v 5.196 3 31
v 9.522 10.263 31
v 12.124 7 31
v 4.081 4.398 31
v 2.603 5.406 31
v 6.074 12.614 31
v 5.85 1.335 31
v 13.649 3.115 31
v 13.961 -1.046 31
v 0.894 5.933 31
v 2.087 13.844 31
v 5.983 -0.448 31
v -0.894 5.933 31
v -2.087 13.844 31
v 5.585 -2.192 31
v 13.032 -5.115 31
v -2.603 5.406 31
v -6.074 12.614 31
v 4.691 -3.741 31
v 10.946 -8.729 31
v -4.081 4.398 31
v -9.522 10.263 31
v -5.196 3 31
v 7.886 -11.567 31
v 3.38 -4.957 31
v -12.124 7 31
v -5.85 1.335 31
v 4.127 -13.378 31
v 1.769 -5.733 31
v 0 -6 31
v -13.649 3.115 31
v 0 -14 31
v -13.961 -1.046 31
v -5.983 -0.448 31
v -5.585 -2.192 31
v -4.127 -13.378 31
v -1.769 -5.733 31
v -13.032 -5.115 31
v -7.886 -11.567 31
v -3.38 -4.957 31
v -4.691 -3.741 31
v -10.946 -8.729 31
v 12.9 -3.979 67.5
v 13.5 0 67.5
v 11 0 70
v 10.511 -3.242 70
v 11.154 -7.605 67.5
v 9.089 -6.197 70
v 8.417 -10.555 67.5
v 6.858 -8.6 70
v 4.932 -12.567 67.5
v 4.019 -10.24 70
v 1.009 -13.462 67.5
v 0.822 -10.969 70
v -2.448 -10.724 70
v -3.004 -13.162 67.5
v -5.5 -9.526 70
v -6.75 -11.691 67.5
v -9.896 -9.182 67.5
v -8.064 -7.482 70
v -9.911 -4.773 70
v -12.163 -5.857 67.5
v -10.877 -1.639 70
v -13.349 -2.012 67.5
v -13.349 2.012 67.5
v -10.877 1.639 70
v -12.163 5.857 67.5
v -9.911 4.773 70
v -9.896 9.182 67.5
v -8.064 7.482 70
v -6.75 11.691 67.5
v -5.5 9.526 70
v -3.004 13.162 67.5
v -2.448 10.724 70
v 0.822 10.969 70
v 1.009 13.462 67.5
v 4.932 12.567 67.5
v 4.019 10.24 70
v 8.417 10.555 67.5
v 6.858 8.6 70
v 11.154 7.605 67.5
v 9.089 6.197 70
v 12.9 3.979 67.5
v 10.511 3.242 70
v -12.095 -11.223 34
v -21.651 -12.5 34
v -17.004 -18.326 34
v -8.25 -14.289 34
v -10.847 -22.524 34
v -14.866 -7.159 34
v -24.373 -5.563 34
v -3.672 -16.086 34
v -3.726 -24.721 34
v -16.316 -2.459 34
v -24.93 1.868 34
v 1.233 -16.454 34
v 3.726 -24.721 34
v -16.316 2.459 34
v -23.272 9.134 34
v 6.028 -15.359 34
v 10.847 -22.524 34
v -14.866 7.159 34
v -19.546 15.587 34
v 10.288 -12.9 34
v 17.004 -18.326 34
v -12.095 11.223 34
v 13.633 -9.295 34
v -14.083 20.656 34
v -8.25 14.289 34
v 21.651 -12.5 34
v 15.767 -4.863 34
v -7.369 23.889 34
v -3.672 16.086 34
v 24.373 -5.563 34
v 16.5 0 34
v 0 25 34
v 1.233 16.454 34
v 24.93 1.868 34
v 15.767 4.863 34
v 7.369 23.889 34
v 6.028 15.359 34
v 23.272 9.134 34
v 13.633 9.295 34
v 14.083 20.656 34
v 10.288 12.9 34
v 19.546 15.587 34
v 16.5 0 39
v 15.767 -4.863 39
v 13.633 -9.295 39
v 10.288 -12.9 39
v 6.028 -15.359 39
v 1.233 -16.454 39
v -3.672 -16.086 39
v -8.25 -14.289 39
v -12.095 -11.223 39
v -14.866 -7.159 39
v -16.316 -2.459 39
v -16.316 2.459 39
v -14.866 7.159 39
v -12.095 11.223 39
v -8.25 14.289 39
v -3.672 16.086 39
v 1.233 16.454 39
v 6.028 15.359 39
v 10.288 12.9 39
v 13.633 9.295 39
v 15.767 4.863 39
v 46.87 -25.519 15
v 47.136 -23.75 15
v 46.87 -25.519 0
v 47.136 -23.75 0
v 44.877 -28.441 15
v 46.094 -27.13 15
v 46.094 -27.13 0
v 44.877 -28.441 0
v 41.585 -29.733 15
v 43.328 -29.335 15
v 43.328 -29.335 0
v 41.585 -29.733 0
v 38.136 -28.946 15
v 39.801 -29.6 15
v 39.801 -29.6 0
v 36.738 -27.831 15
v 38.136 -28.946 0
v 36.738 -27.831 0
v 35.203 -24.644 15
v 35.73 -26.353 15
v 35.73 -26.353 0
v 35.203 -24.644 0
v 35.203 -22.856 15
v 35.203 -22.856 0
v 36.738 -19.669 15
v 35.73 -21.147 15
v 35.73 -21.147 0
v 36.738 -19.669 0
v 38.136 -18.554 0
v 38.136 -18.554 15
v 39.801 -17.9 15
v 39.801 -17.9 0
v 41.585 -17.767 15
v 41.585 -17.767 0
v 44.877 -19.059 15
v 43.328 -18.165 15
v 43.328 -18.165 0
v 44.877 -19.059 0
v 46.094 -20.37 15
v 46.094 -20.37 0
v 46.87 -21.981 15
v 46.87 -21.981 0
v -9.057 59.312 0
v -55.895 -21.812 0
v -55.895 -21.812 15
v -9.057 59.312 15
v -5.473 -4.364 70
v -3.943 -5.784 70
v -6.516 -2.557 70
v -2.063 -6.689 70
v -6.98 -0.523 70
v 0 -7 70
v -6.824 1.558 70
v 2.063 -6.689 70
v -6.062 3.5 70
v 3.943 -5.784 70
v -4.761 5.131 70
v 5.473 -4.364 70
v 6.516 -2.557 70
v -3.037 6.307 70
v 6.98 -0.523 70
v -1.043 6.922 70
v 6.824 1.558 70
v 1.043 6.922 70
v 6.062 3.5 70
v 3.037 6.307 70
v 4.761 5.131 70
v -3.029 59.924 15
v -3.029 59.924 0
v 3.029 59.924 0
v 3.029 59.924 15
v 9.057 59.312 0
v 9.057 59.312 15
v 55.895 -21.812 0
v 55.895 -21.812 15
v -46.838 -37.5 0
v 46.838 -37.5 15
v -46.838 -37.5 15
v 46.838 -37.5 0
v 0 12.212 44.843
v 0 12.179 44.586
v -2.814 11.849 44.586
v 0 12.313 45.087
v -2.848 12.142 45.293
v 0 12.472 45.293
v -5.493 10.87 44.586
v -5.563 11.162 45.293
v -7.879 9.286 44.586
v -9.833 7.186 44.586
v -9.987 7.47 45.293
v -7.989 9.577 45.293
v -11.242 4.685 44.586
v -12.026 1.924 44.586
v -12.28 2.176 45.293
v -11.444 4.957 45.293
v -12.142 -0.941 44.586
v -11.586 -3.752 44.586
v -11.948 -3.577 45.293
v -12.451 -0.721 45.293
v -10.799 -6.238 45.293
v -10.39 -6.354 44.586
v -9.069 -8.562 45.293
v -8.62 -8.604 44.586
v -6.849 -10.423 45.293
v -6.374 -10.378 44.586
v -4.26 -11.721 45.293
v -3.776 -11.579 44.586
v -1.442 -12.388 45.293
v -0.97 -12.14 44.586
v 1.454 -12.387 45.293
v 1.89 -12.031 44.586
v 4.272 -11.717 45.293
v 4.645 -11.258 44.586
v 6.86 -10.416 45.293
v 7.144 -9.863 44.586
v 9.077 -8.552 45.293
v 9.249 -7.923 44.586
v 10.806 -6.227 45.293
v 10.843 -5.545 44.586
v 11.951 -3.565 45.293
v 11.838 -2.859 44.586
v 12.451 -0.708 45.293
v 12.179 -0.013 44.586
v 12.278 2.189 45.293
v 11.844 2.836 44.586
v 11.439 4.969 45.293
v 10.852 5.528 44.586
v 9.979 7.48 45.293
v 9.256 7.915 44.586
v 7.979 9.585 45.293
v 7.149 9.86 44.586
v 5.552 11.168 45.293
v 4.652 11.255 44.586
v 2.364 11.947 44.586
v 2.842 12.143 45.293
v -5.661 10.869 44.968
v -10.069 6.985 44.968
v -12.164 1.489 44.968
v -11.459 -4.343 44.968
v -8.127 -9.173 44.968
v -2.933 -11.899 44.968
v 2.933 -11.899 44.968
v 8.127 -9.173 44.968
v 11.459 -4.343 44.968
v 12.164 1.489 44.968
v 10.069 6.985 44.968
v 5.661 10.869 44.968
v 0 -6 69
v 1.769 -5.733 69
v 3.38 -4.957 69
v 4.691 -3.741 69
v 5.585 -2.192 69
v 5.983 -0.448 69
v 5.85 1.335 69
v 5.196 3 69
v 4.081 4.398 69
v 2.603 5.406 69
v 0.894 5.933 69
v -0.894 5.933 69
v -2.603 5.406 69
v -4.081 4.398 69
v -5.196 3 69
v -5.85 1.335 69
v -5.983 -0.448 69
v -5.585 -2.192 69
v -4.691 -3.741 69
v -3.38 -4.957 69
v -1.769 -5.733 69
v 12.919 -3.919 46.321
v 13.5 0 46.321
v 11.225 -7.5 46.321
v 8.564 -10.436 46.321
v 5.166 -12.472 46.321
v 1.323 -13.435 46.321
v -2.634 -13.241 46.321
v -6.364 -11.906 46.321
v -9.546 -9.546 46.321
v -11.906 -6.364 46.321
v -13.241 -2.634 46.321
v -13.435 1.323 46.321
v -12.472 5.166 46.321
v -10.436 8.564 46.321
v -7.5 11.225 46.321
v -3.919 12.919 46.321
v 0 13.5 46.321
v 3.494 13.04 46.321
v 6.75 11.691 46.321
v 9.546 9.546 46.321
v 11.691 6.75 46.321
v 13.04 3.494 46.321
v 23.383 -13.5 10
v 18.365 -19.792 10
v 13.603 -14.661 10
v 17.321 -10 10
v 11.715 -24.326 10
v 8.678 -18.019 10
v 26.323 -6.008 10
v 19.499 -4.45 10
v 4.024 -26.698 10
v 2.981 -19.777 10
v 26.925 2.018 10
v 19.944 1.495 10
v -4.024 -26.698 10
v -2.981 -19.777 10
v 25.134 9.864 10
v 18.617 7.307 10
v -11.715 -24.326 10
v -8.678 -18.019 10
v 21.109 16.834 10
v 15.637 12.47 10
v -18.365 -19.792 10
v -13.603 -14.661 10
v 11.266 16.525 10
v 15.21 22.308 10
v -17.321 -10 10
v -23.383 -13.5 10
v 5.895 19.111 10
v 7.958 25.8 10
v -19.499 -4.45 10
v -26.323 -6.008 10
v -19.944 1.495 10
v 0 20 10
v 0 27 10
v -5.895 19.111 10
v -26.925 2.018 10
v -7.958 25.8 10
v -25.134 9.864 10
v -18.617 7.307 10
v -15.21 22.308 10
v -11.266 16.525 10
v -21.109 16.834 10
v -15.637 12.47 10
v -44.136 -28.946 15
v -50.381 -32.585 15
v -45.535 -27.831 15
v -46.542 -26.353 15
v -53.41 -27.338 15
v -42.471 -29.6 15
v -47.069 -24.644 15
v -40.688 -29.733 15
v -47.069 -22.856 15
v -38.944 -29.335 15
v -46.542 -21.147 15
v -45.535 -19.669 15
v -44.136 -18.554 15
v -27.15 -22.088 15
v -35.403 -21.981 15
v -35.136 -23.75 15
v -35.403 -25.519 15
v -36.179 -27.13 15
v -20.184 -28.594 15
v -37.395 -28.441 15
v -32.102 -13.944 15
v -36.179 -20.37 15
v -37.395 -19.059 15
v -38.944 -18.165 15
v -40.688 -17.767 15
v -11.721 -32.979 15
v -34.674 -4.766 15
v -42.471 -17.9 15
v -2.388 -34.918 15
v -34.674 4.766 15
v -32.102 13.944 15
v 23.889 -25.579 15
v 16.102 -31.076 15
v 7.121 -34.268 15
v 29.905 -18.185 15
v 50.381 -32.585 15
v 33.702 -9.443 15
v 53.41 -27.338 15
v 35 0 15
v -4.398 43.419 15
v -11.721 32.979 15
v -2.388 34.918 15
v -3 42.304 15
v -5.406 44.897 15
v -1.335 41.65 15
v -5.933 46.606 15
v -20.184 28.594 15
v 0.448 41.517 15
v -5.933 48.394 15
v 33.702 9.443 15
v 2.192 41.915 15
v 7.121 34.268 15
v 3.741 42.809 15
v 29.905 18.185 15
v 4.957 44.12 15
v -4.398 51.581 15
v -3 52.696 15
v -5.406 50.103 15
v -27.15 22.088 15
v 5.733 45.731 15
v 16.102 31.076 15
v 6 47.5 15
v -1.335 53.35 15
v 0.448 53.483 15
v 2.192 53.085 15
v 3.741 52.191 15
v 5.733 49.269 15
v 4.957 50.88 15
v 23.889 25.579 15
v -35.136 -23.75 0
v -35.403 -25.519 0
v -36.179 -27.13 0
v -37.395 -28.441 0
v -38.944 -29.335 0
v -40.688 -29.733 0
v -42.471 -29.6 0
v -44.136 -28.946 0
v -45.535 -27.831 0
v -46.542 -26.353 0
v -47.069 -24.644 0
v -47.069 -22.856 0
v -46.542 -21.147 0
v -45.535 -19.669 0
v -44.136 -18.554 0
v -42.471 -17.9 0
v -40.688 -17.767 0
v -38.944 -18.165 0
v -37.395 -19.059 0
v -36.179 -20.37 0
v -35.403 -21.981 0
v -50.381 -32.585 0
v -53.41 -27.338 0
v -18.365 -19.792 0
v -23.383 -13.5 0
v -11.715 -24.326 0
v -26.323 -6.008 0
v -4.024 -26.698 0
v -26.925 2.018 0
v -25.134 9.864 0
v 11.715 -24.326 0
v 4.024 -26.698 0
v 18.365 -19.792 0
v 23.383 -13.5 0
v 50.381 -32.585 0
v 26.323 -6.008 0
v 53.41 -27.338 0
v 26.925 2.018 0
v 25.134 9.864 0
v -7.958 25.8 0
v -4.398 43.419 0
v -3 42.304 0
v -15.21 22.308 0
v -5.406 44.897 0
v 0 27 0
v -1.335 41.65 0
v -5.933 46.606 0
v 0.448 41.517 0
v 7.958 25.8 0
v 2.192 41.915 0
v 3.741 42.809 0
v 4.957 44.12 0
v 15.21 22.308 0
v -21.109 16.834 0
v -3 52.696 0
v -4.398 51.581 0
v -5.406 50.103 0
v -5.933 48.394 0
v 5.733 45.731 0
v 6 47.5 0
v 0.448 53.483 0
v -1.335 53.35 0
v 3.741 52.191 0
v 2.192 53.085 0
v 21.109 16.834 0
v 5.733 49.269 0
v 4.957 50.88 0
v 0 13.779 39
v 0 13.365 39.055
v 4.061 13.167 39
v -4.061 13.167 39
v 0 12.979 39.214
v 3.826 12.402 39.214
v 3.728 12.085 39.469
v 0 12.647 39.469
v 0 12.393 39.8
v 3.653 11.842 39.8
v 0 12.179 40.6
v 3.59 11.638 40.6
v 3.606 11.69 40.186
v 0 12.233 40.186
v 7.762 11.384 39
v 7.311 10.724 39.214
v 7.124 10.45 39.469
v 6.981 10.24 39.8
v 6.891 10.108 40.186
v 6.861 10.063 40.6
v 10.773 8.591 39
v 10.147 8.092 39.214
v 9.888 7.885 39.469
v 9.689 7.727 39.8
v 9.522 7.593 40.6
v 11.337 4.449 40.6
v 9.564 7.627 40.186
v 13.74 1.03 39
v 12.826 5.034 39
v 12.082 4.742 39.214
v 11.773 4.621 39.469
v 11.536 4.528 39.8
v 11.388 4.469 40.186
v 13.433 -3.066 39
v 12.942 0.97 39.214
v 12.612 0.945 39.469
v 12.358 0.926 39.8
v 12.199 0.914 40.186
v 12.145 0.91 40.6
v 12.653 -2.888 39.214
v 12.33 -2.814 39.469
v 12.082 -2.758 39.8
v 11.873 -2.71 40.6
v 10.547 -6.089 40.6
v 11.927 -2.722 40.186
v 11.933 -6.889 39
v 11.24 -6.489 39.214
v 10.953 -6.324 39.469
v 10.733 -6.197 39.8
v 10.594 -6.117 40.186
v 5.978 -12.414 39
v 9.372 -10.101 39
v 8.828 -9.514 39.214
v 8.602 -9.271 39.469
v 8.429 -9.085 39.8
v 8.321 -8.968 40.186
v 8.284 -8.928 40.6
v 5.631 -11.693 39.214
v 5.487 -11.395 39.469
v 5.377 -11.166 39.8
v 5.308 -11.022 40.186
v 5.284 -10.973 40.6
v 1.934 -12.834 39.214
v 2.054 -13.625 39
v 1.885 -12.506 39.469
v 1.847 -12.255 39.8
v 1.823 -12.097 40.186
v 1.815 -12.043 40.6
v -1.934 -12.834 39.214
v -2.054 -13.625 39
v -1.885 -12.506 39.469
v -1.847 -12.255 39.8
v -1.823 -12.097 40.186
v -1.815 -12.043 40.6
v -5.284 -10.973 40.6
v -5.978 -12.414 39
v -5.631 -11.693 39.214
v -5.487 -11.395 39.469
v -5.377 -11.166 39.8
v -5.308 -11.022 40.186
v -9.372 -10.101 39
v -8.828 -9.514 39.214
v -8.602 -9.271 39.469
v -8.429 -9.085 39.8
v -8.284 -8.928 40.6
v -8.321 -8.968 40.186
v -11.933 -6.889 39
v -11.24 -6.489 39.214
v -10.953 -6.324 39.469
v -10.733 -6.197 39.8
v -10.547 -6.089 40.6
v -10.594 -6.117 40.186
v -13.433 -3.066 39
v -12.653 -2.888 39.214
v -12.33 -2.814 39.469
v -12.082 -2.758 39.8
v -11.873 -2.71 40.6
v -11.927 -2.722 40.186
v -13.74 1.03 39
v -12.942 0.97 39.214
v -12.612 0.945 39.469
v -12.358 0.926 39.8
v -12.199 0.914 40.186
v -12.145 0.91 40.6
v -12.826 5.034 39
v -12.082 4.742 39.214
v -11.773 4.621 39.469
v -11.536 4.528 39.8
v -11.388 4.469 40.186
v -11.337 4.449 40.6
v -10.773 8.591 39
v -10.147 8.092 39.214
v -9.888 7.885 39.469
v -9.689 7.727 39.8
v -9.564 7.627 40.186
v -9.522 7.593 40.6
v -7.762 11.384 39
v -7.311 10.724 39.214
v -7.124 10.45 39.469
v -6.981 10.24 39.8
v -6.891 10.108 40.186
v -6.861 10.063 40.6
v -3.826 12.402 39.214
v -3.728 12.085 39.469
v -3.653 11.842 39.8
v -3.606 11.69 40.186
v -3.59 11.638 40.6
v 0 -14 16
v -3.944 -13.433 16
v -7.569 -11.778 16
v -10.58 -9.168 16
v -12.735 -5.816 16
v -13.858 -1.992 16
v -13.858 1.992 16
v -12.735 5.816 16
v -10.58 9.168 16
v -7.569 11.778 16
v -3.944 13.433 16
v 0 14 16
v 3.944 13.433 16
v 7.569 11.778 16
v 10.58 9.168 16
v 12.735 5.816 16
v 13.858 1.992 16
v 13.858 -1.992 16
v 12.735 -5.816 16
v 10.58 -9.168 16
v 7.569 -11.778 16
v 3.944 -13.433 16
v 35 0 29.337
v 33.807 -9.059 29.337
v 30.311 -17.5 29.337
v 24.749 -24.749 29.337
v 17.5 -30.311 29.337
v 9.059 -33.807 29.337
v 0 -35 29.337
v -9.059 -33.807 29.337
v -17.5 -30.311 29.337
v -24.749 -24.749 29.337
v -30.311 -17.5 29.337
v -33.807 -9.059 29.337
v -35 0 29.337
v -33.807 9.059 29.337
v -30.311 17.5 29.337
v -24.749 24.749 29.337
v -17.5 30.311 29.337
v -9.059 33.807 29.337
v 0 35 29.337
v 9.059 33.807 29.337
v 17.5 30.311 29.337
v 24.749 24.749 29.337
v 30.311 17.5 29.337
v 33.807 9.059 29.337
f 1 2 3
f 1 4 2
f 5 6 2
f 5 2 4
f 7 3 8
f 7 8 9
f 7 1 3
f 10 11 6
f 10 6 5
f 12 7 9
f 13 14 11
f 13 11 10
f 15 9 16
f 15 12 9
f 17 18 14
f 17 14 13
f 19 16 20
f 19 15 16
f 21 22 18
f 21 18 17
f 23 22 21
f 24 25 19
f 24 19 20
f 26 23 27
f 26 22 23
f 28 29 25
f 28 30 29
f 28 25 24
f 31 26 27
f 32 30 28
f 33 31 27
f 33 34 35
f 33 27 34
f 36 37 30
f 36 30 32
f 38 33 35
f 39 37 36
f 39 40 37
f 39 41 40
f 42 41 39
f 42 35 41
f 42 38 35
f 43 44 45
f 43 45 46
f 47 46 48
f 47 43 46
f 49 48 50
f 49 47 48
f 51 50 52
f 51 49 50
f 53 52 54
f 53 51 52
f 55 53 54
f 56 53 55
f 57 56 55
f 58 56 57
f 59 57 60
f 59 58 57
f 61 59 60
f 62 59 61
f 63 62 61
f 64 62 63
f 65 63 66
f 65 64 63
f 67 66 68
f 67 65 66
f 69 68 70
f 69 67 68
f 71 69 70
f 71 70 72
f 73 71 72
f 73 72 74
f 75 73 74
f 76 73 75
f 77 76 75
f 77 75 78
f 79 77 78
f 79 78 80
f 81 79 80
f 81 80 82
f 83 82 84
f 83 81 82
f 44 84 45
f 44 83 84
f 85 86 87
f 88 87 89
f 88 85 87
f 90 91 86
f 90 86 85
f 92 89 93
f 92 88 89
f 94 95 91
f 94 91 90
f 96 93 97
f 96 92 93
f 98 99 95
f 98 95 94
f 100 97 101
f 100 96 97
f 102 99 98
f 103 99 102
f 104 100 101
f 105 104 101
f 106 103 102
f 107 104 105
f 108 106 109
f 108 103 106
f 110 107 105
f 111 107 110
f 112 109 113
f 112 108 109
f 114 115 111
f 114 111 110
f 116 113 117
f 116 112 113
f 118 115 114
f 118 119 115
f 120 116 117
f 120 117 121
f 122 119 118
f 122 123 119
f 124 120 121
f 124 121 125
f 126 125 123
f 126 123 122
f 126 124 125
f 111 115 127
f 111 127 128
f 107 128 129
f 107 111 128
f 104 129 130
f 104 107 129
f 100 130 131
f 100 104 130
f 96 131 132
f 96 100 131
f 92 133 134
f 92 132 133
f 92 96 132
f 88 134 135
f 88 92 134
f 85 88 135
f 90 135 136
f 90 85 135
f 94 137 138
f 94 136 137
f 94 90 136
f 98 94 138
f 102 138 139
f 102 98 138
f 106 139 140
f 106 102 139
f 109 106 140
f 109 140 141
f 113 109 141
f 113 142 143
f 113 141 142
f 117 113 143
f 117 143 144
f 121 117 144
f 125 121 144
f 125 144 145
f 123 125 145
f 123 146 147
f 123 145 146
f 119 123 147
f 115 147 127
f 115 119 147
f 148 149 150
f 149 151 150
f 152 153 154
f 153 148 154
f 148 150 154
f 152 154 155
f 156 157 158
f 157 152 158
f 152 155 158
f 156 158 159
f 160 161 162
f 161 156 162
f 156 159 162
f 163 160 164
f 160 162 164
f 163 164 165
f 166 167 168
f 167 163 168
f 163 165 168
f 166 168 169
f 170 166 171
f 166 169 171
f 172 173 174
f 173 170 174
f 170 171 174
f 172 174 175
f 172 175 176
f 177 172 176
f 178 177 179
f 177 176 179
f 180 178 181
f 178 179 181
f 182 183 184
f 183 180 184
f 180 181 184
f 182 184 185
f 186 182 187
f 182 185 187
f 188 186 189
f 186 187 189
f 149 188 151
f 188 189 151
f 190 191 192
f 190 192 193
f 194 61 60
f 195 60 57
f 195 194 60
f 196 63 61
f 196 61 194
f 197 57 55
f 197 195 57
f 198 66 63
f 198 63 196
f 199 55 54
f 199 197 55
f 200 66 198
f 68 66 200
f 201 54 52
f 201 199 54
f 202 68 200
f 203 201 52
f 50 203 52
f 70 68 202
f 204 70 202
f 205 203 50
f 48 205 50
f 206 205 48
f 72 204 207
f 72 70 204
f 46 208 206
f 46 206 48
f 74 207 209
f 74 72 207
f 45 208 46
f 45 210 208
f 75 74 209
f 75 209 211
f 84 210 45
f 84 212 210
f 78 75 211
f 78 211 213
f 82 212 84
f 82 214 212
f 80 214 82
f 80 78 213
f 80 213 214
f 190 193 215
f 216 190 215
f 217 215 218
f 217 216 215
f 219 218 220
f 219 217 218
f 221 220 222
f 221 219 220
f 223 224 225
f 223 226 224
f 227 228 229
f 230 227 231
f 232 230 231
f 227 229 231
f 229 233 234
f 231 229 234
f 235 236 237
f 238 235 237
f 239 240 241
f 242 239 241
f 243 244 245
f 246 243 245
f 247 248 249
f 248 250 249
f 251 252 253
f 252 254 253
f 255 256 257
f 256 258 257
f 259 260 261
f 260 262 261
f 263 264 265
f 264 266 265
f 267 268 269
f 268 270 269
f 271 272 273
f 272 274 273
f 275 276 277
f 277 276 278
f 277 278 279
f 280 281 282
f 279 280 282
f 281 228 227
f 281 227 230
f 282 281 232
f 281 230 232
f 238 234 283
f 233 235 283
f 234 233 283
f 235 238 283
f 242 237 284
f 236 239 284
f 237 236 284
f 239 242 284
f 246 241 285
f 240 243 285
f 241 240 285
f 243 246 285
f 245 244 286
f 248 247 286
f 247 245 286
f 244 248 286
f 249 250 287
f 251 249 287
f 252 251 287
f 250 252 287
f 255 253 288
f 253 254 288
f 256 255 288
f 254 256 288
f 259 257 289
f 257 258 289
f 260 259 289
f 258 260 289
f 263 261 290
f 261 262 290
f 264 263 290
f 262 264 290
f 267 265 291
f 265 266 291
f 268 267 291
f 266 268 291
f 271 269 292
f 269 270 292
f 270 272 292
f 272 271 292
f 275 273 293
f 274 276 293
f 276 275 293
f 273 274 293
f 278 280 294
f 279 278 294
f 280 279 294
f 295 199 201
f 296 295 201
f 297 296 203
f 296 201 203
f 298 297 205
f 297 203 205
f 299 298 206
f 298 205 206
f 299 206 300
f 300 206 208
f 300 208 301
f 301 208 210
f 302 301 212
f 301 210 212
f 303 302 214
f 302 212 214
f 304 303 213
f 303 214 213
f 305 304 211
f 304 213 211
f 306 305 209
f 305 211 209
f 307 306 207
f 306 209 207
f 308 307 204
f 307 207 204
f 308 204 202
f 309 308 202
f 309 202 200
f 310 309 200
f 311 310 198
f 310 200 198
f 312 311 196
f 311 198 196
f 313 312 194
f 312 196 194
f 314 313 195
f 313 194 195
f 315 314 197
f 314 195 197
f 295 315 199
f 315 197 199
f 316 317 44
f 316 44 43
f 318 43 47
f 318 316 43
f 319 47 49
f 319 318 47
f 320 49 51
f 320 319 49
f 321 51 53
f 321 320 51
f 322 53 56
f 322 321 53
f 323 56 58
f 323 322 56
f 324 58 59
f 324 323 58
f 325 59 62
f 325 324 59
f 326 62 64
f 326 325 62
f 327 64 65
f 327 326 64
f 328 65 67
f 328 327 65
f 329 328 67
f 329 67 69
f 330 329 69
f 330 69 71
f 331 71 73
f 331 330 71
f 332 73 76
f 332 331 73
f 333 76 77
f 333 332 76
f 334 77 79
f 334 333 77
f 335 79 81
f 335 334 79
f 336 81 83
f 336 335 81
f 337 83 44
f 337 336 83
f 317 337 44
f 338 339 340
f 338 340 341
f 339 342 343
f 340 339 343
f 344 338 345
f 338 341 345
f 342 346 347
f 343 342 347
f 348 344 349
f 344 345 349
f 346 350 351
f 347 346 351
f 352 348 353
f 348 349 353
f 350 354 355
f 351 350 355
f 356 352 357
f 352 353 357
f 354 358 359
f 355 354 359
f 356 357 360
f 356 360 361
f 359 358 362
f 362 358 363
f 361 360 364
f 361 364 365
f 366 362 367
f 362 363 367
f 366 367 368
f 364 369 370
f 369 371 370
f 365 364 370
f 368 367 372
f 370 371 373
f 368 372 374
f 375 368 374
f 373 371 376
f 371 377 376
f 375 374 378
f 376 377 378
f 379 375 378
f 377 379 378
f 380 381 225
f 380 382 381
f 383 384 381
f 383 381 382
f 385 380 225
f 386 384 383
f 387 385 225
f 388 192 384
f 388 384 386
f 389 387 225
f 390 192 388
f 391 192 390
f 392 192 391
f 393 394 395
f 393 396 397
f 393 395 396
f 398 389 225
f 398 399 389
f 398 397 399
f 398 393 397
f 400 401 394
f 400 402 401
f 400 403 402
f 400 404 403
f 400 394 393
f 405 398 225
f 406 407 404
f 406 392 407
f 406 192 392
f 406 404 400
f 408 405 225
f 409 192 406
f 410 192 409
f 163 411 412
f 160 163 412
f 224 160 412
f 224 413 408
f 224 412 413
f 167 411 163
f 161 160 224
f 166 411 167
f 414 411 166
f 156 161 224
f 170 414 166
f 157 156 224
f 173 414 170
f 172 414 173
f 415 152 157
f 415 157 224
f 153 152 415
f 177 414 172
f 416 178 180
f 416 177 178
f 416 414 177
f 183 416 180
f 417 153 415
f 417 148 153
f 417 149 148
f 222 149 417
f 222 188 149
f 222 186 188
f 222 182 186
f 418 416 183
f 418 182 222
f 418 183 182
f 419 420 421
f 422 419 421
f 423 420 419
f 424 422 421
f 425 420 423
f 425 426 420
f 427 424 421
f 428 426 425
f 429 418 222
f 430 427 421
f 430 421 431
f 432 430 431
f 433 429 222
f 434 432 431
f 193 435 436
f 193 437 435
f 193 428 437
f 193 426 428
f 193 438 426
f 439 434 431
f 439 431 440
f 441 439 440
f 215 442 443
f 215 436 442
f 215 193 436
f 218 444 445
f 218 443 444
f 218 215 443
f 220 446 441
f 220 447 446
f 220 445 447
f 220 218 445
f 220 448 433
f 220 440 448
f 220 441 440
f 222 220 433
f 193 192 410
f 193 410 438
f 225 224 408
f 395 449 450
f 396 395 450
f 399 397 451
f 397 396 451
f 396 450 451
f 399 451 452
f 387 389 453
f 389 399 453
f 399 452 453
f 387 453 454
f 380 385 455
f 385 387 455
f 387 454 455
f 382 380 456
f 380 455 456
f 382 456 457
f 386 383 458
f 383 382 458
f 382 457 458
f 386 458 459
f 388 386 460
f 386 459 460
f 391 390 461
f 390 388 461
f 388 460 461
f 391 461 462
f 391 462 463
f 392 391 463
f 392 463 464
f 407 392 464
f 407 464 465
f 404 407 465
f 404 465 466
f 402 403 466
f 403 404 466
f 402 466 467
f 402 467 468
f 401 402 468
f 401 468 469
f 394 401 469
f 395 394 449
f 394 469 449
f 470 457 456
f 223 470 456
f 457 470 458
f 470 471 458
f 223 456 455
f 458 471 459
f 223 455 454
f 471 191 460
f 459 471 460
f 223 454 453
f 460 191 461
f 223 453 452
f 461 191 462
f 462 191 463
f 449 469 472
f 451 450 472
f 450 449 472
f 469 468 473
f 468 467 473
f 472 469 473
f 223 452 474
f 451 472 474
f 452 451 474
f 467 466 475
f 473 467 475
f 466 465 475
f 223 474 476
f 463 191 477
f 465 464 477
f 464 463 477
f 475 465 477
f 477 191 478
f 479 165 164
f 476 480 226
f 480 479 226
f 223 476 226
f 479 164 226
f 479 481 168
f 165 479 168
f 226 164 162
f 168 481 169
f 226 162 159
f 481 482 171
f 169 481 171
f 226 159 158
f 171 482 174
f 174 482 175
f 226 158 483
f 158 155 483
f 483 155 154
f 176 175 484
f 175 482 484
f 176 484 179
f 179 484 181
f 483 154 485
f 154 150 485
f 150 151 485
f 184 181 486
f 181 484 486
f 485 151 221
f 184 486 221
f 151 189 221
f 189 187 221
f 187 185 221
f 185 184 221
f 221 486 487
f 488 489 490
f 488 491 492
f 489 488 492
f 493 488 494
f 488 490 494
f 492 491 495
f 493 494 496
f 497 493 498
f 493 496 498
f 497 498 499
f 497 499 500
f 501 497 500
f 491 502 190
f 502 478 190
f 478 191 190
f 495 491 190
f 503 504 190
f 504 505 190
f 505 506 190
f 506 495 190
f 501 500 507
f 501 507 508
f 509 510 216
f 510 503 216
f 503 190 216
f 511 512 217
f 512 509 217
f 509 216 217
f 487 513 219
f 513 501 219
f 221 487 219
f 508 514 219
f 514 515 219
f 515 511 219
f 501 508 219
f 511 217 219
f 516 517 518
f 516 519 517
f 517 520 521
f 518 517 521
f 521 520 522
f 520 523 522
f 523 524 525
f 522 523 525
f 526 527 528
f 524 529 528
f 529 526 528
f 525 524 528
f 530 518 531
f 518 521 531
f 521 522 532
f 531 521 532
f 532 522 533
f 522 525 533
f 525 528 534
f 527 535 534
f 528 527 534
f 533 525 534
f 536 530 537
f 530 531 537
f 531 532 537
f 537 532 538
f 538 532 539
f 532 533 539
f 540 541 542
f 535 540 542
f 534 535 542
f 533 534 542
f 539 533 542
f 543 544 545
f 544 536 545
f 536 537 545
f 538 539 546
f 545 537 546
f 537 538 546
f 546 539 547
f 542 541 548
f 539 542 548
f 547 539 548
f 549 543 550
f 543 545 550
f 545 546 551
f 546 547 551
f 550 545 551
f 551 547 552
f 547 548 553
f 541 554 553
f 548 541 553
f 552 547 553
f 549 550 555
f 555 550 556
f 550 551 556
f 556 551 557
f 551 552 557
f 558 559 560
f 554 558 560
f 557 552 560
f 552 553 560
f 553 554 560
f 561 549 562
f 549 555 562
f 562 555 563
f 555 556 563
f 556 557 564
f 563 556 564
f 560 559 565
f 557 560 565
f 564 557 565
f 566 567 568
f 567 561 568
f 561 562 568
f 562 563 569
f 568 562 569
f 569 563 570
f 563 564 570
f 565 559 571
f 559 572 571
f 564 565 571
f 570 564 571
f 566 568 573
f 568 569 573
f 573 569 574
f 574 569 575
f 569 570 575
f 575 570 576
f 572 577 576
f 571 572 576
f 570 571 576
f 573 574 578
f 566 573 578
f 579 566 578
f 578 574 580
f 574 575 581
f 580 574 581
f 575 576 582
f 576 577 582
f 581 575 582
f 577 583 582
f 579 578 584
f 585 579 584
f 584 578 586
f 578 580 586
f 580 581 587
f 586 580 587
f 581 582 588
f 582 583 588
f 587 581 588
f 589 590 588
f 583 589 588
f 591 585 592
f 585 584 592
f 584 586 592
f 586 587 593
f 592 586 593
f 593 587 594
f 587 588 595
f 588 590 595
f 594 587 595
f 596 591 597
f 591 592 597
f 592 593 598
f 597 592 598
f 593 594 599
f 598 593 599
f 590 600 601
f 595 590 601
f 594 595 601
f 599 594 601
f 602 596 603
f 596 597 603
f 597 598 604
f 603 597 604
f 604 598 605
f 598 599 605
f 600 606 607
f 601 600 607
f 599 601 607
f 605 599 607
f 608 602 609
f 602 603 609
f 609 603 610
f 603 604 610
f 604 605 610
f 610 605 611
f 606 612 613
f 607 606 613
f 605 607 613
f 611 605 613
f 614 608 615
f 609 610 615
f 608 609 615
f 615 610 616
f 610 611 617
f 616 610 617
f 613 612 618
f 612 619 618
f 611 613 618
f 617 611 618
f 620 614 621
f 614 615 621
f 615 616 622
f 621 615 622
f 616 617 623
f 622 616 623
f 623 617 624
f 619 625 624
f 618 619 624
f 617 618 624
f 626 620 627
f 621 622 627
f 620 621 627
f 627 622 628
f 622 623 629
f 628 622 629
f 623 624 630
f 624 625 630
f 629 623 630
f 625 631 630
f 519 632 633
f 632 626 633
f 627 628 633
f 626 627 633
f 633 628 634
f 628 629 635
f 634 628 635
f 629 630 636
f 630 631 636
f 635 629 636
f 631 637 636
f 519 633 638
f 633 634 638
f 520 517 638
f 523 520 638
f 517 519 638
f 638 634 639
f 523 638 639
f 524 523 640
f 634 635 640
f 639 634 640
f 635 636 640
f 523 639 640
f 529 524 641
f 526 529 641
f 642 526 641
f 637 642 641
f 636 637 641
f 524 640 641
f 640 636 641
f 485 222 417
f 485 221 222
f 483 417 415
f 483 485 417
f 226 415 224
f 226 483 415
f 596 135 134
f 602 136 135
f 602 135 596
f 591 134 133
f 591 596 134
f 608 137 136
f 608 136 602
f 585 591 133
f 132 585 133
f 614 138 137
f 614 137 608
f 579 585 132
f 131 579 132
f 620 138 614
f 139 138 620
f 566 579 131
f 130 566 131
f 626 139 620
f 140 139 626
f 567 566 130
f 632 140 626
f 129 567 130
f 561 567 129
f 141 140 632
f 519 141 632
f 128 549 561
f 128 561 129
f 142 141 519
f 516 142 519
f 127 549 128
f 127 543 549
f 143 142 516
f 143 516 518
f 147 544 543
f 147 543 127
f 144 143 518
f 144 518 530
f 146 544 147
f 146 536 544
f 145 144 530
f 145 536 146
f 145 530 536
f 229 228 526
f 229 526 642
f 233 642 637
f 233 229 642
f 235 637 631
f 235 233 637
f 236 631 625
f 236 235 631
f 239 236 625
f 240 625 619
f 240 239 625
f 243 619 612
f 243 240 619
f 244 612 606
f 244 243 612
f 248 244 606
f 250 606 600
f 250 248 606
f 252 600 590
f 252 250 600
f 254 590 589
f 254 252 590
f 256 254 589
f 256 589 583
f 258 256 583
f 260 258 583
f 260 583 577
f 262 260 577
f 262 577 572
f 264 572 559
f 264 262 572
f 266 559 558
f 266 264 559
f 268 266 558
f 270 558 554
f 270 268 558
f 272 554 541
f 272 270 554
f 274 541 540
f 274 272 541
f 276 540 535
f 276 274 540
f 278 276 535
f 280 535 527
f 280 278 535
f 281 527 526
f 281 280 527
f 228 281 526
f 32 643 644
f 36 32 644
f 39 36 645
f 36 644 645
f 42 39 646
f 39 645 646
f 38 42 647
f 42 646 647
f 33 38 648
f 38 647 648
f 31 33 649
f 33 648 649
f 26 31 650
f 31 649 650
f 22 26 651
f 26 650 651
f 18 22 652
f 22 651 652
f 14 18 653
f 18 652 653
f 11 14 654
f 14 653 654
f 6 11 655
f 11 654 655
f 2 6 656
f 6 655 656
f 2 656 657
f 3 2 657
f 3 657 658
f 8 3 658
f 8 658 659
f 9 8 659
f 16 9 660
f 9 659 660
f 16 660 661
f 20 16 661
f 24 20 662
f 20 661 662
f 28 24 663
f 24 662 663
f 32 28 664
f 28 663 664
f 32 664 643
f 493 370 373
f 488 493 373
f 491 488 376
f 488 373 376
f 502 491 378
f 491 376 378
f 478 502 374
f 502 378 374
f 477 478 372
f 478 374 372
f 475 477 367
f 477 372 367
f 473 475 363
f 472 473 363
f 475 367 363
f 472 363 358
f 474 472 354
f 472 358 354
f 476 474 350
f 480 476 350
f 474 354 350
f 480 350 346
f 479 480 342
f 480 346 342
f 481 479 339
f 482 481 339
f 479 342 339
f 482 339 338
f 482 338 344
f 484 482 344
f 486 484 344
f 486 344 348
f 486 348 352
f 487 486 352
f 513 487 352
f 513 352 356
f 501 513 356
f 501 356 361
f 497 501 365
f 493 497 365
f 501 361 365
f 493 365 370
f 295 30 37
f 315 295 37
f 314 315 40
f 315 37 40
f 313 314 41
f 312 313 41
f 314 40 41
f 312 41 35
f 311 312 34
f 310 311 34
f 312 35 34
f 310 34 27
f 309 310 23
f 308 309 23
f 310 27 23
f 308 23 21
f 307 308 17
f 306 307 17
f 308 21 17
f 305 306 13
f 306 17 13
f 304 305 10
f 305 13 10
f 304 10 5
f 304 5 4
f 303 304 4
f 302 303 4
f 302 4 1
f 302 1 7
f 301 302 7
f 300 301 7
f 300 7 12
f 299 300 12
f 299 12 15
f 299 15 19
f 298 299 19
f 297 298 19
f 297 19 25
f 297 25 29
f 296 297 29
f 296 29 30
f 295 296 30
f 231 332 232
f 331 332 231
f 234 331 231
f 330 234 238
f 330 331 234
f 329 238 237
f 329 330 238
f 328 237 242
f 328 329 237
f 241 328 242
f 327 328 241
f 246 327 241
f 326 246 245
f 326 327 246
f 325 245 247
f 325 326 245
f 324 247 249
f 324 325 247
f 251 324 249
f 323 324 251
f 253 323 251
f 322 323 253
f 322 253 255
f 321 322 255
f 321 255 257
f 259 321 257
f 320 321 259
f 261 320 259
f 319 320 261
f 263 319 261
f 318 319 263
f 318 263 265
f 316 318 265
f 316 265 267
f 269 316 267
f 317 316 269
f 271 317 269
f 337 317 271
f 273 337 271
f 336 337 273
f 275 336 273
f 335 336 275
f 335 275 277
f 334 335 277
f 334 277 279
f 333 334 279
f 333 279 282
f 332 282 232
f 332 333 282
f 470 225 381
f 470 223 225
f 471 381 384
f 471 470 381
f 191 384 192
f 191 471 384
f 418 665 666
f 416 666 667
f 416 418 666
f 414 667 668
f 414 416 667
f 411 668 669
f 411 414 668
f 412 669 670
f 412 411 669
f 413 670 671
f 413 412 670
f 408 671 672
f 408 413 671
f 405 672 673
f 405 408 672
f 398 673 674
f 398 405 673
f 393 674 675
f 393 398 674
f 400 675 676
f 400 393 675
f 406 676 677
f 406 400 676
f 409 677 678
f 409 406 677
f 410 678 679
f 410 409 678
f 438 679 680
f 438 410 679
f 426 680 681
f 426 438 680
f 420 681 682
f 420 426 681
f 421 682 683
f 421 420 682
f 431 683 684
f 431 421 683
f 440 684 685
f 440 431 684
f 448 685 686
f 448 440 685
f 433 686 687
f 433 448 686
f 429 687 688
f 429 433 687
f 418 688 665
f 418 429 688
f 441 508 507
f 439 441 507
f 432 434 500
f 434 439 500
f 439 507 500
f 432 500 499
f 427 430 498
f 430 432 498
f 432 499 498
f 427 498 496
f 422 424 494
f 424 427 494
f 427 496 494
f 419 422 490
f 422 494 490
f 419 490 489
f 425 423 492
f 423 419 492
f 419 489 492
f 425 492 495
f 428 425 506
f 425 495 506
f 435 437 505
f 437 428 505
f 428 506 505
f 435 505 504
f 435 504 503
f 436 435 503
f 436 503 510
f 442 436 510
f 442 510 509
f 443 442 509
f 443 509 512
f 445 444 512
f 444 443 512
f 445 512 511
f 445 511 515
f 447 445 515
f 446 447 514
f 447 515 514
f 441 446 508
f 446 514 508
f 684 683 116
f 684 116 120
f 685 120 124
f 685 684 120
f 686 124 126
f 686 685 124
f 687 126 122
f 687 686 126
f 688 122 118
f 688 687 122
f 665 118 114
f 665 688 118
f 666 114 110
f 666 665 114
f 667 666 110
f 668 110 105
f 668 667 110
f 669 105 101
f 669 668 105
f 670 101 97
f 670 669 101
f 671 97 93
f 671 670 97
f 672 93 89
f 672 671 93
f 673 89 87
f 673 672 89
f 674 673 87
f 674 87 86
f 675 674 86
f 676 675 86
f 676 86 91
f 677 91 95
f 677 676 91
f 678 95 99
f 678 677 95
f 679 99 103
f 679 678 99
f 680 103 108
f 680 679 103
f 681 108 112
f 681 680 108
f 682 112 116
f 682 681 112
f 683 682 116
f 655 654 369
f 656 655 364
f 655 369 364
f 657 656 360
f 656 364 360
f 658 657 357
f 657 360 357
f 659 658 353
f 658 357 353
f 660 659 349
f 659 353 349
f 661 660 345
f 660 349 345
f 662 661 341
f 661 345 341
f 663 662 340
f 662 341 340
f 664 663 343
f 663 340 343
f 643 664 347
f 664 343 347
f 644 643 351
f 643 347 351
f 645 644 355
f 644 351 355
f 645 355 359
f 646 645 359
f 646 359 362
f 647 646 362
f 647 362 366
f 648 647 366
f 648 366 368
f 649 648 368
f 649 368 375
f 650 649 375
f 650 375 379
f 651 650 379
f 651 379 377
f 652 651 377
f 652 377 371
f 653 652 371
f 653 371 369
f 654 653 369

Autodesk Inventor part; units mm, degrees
ref_plane "YZ Plane" through (0, 0, 0) normal (1, 0, 0) x (0, 1, 0)
ref_plane "XZ Plane" through (0, 0, 0) normal (0, 1, 0) x (-1, 0, 0)
ref_plane "XY Plane" through (0, 0, 0) normal (0, 0, 1) x (1, 0, 0)
sketch "Эскиз1" plane through (0, 0, 0) normal (0, 0, 1) x (1, 0, 0)
  line L0 (9.0572, 59.3125) -> (55.8947, -21.8125)
  line L1 (46.8375, -37.5) -> (-46.8375, -37.5)
  line L2 (-55.8947, -21.8125) -> (-9.0572, 59.3125)
  arc A0 (9.0572, 59.3125) -> (-9.0572, 59.3125) centre (0, 0) ccw
  arc A1 (-55.8947, -21.8125) -> (-46.8375, -37.5) centre (0, 0) ccw
  arc A2 (46.8375, -37.5) -> (55.8947, -21.8125) centre (0, 0) ccw
  circle A3 centre (0, 47.5) radius 6
  circle A4 centre (-41.1362, -23.75) radius 6
  circle A5 centre (41.1362, -23.75) radius 6
  dimension "d3" = 12
  dimension "d6" = 360
extrude "Выдавливание1" add sketch "Эскиз1" along normal blind 15
sketch "Эскиз2" plane through (0, 0, 15) normal (0, 0, 1) x (1, 0, 0)
  circle A0 centre (0, 0) radius 35
  dimension "d10" = 70
extrude "Выдавливание2" add sketch "Эскиз2" along normal blind 19
sketch "Эскиз3" plane through (0, 0, 0) normal (1, 0, 0) x (0, 1, 0)
  line L0 (-35, 15) -> (-35, 34) projected
  line L1 (35, 34) -> (-35, 34) projected
  line L2 (35, 15) -> (35, 34) projected
  line L3 (35, 29.3369) -> (25, 34)
  line L4 (0, 34) -> (0, 40.7436)
  point P0 (0, 0)
  dimension "d13" = 25
  dimension "d14" = 25
revolve "Вращение1" cut sketch "Эскиз3" angle 360 about axis through (0, 0, 34) along (0, 0, 1)
sketch "Эскиз4" plane through (0, 0, 34) normal (0, 0, 1) x (1, 0, 0)
  circle A0 centre (0, 0) radius 16.5
  dimension "d16" = 33
extrude "Выдавливание3" add sketch "Эскиз4" along normal blind 5
sketch "Эскиз5" plane through (0, 0, 39) normal (0, 0, 1) x (1, 0, 0)
  circle A0 centre (0, 0) radius 13.5
  dimension "d19" = 27
extrude "Выдавливание4" add sketch "Эскиз5" along normal blind 31
sketch "Эскиз6" plane through (0, 0, 0) normal (1, 0, 0) x (0, 1, 0)
  line L0 (-13.5, 39) -> (13.5, 39) projected
  line L1 (16.5, 39) -> (-16.5, 39) projected
  line L2 (13.5, 70) -> (-13.5, 70) projected
  line L3 (0, 70) -> (0, 78.8813)
  line L4 (12.1787, 39) -> (12.1787, 45)
  line L5 (12.1787, 45) -> (13.5, 46.3213)
  line L6 (13.5, 39) -> (13.5, 70) projected
  point P0 (0, 0)
  dimension "d22" = 45
  dimension "d23" = 6
revolve "Вращение2" cut sketch "Эскиз6" angle 360 about axis through (0, 0, 70) along (0, 0, 1)
fillet "Сопряжение1" radius 1.6 1 edges at (0, -12.1787, 39)
fillet "Сопряжение2" radius 1 1 edges at (0, -12.1787, 45)
thread "Резьба1" size "M27x3" class "6g" standard "ISO Metric profile" full length
chamfer "Фаска1" distance 2.5 angle 45 1 edges at (-13.5, 0, 70)
sketch "Эскиз7" plane through (0, 0, 0) normal (0, 0, -1) x (-1, 0, 0)
  point P0 (0, 0)
  point P1 (0, 0)
hole "Отверстие1" at (0, 0, 0) direction (0, 0, 1) diameter 54 depth 10
sketch "Эскиз8" plane through (0, 0, 10) normal (0, 0, -1) x (-1, 0, 0)
  point P0 (0, 0)
  point P1 (0, 0)
sketch "Эскиз9" plane through (0, 0, 70) normal (0, 0, 1) x (1, 0, 0)
  point P0 (0, 0)
  point P1 (0, 0)
hole "Отверстие2" at (0, 0, 70) direction (0, 0, -1) diameter 12 depth 39
chamfer "Фаска2" distance 1 angle 45 1 edges at (0, 6, 70)
sketch "Эскиз10" plane through (0, 0, 31) normal (0, 0, 1) x (1, 0, 0)
  point P0 (0, 0)
  point P1 (0, 0)
hole "Отверстие3" at (0, 0, 31) direction (0, 0, -1) diameter 28 end through all
sketch "Эскиз11" plane through (0, 0, 0) normal (1, 0, 0) x (0, 1, 0)
  line L0 (14, 10) -> (-14, 10) projected
  line L1 (-27, 10) -> (27, 10) projected
  line L2 (-14, 31) -> (14, 31) projected
  line L3 (0, 10) -> (0, -15.8706)
  line L4 (20, 10) -> (14, 16)
  line L5 (14, 10) -> (-14, 10) projected
  line L6 (-14, 31) -> (14, 31) projected
  line L7 (14, 10) -> (14, 22.3316)
  line L8 (14, 10) -> (14, 31) projected
  point P0 (0, 0)
  dimension "d56" = 45
  dimension "d57" = 6
revolve "Вращение3" cut sketch "Эскиз11" angle 360 about axis through (0, 0, 10) along (0, 0, -1)
properties part number "Люляев"
